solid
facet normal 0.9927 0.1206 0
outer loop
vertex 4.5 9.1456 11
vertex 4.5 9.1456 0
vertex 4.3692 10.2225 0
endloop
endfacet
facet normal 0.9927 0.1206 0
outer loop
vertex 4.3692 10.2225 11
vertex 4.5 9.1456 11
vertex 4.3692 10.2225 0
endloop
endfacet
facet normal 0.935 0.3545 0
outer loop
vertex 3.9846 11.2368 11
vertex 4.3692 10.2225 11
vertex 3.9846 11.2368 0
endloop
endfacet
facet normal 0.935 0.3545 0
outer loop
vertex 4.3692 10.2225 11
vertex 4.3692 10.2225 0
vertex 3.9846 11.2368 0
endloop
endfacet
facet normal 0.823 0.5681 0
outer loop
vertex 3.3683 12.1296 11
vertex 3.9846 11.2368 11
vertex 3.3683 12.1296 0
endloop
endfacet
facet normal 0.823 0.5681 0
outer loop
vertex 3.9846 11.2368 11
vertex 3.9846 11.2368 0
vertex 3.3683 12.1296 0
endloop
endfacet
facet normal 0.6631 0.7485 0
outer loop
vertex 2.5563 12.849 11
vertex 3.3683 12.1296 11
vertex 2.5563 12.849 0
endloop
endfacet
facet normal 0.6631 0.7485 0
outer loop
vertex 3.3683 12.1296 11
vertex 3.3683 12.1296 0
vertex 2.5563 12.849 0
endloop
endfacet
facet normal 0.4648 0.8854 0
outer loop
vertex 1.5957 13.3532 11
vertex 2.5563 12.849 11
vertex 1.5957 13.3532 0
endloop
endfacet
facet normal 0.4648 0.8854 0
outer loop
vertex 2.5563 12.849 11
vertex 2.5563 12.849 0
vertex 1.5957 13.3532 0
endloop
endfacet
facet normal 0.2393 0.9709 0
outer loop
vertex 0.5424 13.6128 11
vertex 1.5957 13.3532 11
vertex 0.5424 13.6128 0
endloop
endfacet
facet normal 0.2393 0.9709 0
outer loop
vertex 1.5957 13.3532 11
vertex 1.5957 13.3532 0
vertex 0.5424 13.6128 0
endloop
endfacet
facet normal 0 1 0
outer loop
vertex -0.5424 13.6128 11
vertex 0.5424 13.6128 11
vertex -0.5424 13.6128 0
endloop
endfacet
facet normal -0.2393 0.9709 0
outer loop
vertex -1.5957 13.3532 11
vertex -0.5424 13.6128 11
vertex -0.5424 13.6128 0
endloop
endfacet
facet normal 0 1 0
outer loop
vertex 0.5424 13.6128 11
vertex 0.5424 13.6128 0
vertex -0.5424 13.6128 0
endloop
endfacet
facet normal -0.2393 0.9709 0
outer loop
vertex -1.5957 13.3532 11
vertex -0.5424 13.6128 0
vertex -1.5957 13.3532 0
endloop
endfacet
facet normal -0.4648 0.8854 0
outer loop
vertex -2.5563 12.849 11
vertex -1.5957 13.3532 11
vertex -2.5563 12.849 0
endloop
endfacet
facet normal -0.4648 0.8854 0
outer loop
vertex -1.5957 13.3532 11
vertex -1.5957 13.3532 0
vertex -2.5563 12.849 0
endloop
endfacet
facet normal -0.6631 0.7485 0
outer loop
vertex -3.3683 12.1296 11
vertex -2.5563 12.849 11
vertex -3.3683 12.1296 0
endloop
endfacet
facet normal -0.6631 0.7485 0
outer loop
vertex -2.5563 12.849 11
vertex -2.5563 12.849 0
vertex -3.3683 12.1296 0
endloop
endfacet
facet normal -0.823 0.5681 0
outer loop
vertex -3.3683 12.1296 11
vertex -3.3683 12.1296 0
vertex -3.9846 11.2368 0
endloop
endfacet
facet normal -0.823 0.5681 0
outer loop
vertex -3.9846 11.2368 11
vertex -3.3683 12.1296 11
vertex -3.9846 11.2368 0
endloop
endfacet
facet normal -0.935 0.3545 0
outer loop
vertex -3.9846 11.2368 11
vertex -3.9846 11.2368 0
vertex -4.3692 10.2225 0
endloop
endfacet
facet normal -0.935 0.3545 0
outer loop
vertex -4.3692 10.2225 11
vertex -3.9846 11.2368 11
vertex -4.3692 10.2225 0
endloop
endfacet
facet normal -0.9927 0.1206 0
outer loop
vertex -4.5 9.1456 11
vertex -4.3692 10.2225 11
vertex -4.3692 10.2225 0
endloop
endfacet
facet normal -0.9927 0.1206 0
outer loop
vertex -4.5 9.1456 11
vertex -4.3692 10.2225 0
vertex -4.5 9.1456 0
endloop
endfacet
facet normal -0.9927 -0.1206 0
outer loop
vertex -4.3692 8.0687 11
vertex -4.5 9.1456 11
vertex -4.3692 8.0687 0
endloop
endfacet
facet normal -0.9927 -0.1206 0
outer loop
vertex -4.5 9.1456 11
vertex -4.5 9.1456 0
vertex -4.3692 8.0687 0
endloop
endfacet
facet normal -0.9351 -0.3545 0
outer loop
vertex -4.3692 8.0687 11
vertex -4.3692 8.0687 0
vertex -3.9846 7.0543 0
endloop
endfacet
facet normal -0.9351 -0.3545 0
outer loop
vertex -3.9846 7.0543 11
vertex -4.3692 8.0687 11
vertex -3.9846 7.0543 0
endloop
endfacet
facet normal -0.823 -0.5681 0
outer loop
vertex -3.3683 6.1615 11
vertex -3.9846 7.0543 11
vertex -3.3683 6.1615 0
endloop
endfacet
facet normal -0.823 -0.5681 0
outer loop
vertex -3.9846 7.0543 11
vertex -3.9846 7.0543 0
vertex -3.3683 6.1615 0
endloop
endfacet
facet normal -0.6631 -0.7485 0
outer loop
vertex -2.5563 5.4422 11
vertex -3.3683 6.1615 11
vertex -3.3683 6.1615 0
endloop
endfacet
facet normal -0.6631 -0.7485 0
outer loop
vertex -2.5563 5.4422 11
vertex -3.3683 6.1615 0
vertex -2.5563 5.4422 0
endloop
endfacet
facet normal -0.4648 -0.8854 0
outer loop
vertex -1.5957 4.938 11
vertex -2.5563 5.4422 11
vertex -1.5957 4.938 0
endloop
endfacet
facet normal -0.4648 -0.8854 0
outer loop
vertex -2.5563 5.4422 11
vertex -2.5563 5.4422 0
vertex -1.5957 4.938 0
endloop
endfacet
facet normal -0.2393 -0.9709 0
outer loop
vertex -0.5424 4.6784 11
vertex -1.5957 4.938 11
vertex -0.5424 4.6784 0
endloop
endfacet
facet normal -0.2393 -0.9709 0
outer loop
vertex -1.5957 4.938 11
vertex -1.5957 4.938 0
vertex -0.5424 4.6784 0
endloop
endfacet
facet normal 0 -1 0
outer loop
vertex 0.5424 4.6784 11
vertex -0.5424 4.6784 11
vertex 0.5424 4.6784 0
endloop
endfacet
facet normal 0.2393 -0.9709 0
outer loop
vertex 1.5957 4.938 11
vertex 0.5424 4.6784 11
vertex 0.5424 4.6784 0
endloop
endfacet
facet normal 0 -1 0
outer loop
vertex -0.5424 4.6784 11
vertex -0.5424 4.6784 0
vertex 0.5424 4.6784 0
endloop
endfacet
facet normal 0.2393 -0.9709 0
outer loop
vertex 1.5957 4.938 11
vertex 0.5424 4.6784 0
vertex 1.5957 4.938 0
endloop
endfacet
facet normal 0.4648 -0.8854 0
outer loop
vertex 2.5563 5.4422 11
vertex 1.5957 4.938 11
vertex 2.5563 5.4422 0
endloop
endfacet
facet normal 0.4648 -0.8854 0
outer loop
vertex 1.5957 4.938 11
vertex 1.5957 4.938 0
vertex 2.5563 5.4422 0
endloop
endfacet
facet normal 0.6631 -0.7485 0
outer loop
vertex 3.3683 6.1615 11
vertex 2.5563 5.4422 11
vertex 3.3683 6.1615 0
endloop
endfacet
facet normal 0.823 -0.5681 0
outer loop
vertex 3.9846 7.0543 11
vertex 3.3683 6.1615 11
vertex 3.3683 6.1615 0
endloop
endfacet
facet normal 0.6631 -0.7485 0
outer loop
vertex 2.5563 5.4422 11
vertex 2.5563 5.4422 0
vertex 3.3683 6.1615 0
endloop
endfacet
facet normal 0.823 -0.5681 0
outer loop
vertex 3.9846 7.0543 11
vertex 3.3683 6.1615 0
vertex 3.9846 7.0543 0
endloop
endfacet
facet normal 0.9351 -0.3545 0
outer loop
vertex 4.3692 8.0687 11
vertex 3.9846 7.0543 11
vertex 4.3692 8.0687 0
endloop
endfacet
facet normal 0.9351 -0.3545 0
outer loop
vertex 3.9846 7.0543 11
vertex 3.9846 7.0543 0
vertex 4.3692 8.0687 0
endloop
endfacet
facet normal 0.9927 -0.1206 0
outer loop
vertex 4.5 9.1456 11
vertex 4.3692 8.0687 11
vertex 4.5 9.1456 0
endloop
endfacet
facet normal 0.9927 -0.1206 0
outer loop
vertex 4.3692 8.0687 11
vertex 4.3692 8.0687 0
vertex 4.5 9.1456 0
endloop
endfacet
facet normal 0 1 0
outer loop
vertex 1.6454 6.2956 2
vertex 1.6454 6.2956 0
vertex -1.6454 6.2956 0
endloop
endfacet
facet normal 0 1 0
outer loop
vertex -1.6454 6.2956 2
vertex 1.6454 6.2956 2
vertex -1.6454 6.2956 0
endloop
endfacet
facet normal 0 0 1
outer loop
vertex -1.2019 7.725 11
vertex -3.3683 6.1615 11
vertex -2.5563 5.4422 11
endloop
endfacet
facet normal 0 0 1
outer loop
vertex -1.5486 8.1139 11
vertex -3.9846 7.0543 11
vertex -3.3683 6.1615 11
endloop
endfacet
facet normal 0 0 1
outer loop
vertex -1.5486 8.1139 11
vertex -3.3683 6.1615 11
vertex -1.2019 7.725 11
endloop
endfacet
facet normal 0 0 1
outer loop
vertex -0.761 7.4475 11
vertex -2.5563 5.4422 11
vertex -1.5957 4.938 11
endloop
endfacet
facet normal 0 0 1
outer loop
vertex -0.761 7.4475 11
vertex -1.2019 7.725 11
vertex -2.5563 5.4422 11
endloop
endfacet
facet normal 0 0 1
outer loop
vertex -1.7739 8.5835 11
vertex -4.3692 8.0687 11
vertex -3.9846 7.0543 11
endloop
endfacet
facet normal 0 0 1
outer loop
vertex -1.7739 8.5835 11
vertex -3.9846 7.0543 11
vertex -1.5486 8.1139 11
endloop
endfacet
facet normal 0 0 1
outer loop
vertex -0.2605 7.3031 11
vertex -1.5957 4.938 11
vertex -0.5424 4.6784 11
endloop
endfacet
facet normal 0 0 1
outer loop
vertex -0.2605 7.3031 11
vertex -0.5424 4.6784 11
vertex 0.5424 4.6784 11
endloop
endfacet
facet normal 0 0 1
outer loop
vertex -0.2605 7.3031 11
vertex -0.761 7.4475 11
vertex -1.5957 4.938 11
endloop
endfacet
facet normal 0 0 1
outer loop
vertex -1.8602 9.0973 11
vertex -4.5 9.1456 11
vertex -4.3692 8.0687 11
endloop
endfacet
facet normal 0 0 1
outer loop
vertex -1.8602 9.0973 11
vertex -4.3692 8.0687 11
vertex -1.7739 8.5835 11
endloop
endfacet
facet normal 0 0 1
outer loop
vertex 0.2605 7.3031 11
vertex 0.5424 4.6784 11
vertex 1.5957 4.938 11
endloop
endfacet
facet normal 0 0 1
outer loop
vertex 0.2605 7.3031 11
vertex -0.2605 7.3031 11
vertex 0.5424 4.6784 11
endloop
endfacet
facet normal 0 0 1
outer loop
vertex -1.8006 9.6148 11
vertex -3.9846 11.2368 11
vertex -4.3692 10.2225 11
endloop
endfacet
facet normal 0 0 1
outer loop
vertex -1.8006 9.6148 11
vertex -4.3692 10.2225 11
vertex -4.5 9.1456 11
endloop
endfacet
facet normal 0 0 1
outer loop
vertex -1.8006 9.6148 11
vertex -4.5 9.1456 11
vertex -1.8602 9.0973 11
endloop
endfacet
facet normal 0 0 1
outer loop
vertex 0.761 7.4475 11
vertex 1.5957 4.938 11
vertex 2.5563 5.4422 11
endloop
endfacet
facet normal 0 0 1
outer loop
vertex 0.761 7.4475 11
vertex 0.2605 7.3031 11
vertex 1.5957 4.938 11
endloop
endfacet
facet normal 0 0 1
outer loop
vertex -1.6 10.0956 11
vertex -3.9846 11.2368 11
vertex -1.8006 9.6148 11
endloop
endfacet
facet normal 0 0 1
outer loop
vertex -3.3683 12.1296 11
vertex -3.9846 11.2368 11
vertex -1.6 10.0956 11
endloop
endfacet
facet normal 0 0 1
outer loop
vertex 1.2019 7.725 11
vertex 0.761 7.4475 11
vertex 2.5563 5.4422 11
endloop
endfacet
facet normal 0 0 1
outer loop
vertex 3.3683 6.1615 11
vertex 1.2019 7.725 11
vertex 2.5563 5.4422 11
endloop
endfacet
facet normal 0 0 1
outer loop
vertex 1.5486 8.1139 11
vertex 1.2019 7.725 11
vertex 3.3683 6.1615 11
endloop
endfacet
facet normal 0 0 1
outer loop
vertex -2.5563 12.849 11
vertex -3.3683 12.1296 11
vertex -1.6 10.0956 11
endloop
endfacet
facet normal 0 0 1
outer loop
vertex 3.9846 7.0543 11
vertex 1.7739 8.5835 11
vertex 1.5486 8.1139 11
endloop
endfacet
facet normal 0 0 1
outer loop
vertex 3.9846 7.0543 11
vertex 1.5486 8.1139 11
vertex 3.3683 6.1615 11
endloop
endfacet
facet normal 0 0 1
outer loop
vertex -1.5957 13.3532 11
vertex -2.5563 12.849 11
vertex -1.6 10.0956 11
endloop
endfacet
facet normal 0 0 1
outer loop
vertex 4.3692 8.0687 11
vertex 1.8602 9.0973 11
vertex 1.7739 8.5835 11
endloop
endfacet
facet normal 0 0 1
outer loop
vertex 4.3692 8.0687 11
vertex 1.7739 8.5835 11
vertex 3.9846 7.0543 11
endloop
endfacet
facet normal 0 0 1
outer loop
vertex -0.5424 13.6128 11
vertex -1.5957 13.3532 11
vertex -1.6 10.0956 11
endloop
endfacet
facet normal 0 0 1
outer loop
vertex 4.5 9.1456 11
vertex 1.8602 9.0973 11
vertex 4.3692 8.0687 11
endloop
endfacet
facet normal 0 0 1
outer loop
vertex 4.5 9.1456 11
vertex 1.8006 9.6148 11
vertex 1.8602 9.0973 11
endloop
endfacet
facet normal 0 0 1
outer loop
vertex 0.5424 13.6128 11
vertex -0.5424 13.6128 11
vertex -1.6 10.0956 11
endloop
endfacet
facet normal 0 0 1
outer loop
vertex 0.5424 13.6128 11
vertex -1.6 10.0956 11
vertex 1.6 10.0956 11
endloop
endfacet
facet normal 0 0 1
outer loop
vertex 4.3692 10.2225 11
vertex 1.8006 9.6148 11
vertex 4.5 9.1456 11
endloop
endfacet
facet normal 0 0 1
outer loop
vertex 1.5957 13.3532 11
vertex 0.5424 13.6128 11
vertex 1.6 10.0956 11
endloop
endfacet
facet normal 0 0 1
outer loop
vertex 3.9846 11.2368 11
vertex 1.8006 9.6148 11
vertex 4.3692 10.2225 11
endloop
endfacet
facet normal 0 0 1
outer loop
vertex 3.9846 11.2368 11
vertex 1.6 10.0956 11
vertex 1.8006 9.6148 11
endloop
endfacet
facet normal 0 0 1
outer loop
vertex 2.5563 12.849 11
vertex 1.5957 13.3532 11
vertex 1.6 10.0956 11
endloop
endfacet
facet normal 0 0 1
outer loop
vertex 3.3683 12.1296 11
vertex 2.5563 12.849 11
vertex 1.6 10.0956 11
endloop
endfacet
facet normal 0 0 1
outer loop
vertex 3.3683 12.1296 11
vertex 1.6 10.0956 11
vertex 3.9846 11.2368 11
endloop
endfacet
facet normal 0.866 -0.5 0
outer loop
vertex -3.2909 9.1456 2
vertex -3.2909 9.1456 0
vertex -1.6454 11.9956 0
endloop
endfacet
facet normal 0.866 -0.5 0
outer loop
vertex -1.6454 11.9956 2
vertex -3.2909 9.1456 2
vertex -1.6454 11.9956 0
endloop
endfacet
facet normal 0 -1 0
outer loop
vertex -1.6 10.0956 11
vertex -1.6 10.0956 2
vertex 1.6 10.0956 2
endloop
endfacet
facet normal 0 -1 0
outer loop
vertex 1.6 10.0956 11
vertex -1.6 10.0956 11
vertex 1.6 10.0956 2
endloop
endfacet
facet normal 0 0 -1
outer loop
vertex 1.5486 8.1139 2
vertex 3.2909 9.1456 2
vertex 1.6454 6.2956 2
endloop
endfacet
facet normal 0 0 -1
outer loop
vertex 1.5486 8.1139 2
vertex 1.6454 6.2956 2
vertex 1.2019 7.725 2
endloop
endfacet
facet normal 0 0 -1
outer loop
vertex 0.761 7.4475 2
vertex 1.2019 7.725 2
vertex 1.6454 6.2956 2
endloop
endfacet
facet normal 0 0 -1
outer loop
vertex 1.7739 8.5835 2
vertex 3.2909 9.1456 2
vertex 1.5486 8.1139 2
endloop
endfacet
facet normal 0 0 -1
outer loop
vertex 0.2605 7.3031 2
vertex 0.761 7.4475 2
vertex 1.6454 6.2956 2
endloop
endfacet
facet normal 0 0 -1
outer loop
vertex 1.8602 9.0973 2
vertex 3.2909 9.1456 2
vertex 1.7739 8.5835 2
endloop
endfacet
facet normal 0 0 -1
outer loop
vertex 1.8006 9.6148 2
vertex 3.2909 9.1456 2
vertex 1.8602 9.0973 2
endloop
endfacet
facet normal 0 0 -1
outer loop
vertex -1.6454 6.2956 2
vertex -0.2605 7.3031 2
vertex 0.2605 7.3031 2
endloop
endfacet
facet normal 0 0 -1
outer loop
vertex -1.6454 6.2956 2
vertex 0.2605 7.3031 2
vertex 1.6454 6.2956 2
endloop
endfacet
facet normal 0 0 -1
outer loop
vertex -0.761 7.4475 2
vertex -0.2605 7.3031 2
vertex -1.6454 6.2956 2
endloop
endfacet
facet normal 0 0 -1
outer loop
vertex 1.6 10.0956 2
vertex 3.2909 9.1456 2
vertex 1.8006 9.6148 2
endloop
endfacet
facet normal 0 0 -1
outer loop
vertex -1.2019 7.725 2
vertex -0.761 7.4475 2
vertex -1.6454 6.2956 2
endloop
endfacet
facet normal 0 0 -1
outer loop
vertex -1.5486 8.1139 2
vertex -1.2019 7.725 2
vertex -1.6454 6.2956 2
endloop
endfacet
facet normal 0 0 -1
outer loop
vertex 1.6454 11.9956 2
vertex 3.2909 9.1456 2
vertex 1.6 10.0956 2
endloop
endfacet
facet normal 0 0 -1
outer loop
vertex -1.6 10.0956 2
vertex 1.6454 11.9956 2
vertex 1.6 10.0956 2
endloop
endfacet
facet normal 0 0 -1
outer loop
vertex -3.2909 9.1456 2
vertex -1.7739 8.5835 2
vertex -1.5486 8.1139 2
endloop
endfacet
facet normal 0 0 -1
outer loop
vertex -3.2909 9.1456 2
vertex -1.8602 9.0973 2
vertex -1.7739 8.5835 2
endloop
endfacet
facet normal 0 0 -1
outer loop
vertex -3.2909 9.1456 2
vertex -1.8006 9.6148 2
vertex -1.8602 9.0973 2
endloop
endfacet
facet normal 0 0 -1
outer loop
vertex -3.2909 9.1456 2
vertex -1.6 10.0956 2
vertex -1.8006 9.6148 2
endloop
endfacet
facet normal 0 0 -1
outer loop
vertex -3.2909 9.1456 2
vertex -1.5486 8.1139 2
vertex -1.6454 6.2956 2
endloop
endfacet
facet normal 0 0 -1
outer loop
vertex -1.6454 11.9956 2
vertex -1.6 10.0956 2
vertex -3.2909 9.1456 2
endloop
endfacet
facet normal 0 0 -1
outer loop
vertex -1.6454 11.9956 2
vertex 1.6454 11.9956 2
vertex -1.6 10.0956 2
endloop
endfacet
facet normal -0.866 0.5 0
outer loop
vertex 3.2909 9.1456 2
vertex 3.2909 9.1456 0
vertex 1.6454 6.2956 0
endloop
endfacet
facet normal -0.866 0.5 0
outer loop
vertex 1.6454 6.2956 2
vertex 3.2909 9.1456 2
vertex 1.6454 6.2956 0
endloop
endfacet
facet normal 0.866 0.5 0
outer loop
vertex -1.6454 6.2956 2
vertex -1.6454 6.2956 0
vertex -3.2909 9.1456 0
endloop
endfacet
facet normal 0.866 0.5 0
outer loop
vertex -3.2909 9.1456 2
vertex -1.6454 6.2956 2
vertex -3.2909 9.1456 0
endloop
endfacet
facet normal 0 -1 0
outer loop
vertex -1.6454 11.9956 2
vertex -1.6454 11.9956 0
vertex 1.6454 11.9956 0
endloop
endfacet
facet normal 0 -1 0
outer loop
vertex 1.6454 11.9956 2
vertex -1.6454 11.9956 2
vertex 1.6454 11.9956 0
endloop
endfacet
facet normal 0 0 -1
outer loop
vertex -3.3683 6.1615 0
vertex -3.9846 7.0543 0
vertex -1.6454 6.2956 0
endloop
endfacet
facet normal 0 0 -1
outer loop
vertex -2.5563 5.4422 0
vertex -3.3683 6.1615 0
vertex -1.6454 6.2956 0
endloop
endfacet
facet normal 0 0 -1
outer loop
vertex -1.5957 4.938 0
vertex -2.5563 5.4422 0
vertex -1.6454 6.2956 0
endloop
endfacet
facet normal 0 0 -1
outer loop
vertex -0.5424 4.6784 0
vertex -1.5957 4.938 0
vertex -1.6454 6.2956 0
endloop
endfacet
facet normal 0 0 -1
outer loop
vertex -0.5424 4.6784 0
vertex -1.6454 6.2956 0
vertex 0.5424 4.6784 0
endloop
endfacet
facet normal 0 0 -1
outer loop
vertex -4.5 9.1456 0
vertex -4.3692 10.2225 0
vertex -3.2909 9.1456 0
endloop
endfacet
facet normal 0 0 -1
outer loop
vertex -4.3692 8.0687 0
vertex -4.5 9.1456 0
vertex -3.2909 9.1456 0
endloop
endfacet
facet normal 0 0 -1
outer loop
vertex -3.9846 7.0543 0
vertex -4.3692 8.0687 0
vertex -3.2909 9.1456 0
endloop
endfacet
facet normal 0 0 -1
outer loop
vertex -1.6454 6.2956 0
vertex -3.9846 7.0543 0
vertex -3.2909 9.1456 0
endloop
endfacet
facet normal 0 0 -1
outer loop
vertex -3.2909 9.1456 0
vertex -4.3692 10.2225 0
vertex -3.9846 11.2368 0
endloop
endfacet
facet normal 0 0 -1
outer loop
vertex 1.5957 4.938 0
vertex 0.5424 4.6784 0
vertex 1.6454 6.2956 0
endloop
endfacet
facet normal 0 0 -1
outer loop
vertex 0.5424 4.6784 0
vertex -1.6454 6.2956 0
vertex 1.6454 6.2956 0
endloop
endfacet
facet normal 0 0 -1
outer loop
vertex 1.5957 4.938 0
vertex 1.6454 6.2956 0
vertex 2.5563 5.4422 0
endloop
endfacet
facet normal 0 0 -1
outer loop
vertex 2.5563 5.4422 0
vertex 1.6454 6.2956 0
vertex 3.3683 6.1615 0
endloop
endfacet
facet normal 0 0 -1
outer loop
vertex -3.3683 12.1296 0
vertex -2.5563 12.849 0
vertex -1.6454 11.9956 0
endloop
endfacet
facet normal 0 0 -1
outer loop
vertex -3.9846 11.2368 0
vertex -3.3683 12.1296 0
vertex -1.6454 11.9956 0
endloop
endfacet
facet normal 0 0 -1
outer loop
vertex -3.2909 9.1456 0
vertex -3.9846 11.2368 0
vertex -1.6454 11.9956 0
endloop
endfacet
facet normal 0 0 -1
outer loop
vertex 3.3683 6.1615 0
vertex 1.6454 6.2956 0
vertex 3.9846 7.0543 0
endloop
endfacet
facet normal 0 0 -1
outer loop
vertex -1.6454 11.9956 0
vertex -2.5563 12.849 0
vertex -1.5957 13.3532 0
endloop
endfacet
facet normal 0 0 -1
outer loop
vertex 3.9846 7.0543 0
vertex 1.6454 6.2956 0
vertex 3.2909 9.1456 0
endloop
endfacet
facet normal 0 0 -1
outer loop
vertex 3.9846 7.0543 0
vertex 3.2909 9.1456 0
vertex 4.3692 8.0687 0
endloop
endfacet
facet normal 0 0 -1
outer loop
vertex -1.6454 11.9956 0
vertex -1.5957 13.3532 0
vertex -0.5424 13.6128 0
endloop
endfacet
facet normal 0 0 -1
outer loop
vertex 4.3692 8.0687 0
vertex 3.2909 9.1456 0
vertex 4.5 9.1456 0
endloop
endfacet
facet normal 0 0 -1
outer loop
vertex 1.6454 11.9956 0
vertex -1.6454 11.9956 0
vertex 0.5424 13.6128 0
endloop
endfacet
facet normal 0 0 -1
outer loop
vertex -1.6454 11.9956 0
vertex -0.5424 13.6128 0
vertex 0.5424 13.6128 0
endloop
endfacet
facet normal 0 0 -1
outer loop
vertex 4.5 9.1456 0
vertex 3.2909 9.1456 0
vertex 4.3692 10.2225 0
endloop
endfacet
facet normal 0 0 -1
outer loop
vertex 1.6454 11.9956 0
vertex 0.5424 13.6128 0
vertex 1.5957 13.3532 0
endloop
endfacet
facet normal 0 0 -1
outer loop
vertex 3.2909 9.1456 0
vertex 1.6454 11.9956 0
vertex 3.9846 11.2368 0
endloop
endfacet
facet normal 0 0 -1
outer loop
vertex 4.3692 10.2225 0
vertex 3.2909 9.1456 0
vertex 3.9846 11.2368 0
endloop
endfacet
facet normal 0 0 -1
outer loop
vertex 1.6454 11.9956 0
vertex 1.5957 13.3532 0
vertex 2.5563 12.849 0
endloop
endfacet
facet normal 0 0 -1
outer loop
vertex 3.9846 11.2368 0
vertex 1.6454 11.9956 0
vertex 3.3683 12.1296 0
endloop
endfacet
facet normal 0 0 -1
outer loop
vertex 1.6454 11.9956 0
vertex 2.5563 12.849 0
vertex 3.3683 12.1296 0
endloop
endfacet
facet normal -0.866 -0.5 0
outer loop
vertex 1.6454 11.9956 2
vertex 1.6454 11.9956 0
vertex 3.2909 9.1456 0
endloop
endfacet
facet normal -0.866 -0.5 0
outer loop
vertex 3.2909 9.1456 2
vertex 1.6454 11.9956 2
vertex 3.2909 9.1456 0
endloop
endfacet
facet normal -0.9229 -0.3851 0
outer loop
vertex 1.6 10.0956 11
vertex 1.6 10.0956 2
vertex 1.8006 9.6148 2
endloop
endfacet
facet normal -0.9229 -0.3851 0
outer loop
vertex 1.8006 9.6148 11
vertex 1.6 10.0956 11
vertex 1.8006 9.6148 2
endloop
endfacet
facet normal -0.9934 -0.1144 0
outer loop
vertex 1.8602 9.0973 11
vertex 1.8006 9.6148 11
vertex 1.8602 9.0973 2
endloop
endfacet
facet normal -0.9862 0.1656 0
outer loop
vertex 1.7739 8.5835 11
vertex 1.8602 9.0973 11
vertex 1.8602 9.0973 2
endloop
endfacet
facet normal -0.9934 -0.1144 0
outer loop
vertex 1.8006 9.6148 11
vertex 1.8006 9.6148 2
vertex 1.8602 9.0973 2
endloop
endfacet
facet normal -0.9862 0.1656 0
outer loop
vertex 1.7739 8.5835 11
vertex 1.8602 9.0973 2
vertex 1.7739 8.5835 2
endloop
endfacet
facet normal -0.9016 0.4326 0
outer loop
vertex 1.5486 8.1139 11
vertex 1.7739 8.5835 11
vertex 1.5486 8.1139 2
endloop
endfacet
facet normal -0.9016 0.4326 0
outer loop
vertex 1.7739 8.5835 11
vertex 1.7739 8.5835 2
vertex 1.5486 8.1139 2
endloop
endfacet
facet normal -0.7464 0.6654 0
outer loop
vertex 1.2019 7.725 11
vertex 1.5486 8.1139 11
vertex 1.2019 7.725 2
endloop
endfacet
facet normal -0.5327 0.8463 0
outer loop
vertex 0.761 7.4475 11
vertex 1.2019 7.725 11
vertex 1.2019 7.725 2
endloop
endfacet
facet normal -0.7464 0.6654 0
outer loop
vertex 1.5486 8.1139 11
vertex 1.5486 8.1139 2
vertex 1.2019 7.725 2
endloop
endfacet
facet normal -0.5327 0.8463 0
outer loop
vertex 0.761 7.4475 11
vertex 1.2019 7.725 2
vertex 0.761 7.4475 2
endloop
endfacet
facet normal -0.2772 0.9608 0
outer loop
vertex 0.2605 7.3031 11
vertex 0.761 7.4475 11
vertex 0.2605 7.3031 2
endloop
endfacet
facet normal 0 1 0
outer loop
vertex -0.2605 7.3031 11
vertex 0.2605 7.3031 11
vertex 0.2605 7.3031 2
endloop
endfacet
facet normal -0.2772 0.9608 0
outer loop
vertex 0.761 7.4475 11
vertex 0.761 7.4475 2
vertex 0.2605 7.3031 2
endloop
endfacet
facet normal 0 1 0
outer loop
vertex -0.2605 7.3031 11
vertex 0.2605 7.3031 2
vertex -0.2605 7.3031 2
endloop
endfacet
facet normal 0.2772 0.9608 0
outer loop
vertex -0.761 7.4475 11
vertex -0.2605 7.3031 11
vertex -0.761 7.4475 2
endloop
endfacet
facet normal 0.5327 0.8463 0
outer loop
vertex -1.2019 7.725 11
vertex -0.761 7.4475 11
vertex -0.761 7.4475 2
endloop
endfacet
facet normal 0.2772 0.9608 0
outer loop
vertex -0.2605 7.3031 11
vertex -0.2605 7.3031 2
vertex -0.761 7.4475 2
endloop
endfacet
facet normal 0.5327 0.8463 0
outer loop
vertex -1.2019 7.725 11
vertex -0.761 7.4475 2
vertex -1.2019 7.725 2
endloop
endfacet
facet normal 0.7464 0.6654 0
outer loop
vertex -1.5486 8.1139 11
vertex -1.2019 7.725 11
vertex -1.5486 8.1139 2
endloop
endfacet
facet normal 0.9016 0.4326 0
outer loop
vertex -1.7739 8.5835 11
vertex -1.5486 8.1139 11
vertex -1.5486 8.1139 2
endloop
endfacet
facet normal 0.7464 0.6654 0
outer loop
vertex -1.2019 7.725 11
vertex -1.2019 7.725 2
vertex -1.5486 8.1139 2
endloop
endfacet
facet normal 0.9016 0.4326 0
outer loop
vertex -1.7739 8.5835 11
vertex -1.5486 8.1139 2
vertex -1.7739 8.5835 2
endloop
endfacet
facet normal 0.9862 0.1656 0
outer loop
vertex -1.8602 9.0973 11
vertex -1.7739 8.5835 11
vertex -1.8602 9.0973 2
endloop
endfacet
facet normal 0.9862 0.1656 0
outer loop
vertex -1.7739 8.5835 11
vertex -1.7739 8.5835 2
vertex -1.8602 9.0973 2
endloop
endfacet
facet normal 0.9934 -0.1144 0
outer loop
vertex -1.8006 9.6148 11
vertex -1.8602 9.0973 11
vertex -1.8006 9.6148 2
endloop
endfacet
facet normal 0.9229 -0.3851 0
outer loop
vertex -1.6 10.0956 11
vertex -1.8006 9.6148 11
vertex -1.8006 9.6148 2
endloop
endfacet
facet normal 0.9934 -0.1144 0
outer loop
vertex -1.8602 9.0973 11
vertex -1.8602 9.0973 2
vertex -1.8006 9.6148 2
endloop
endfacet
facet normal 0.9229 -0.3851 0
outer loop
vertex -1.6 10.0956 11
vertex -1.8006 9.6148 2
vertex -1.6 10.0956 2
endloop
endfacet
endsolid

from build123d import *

# Parameters (mm, degrees)
SKETCH1_R           = 4.5
BOSS_EXTRUDE1_DEPTH = 11
CUT_EXTRUDE3_DEPTH  = 2
CUT_EXTRUDE4_DEPTH  = 12


with BuildPart() as part:
    # Sketch1 → Boss-Extrude1 (new body)
    with BuildSketch(Plane.XY):
        with Locations((0, 9.145577701)):
            Circle(SKETCH1_R)
    extrude(amount=BOSS_EXTRUDE1_DEPTH)

    # Sketch6 → Cut-Extrude3 (cut)
    with BuildSketch(Plane(origin=(0, 0, 0), x_dir=(-1, 0, 0), z_dir=(0, 0, -1))):
        Polygon((3.290896534, 9.145577701), (1.645448267, 11.995577701), (-1.645448267, 11.995577701), (-3.290896534, 9.145577701), (-1.645448267, 6.295577701), (1.645448267, 6.295577701), align=None)
    extrude(amount=-CUT_EXTRUDE3_DEPTH, mode=Mode.SUBTRACT)

    # Sketch7 → Cut-Extrude4 (cut, through all)
    with BuildSketch(Plane(origin=(0, 0, 0), x_dir=(-1, 0, 0), z_dir=(0, 0, -1))):
        with BuildLine():
            Line((1.6, 10.095577701), (-1.6, 10.095577701))
            ThreePointArc((-1.6, 10.095577701), (0, 7.284798295), (1.6, 10.095577701))
        make_face()
    extrude(amount=-CUT_EXTRUDE4_DEPTH, mode=Mode.SUBTRACT)


solid = part.part
